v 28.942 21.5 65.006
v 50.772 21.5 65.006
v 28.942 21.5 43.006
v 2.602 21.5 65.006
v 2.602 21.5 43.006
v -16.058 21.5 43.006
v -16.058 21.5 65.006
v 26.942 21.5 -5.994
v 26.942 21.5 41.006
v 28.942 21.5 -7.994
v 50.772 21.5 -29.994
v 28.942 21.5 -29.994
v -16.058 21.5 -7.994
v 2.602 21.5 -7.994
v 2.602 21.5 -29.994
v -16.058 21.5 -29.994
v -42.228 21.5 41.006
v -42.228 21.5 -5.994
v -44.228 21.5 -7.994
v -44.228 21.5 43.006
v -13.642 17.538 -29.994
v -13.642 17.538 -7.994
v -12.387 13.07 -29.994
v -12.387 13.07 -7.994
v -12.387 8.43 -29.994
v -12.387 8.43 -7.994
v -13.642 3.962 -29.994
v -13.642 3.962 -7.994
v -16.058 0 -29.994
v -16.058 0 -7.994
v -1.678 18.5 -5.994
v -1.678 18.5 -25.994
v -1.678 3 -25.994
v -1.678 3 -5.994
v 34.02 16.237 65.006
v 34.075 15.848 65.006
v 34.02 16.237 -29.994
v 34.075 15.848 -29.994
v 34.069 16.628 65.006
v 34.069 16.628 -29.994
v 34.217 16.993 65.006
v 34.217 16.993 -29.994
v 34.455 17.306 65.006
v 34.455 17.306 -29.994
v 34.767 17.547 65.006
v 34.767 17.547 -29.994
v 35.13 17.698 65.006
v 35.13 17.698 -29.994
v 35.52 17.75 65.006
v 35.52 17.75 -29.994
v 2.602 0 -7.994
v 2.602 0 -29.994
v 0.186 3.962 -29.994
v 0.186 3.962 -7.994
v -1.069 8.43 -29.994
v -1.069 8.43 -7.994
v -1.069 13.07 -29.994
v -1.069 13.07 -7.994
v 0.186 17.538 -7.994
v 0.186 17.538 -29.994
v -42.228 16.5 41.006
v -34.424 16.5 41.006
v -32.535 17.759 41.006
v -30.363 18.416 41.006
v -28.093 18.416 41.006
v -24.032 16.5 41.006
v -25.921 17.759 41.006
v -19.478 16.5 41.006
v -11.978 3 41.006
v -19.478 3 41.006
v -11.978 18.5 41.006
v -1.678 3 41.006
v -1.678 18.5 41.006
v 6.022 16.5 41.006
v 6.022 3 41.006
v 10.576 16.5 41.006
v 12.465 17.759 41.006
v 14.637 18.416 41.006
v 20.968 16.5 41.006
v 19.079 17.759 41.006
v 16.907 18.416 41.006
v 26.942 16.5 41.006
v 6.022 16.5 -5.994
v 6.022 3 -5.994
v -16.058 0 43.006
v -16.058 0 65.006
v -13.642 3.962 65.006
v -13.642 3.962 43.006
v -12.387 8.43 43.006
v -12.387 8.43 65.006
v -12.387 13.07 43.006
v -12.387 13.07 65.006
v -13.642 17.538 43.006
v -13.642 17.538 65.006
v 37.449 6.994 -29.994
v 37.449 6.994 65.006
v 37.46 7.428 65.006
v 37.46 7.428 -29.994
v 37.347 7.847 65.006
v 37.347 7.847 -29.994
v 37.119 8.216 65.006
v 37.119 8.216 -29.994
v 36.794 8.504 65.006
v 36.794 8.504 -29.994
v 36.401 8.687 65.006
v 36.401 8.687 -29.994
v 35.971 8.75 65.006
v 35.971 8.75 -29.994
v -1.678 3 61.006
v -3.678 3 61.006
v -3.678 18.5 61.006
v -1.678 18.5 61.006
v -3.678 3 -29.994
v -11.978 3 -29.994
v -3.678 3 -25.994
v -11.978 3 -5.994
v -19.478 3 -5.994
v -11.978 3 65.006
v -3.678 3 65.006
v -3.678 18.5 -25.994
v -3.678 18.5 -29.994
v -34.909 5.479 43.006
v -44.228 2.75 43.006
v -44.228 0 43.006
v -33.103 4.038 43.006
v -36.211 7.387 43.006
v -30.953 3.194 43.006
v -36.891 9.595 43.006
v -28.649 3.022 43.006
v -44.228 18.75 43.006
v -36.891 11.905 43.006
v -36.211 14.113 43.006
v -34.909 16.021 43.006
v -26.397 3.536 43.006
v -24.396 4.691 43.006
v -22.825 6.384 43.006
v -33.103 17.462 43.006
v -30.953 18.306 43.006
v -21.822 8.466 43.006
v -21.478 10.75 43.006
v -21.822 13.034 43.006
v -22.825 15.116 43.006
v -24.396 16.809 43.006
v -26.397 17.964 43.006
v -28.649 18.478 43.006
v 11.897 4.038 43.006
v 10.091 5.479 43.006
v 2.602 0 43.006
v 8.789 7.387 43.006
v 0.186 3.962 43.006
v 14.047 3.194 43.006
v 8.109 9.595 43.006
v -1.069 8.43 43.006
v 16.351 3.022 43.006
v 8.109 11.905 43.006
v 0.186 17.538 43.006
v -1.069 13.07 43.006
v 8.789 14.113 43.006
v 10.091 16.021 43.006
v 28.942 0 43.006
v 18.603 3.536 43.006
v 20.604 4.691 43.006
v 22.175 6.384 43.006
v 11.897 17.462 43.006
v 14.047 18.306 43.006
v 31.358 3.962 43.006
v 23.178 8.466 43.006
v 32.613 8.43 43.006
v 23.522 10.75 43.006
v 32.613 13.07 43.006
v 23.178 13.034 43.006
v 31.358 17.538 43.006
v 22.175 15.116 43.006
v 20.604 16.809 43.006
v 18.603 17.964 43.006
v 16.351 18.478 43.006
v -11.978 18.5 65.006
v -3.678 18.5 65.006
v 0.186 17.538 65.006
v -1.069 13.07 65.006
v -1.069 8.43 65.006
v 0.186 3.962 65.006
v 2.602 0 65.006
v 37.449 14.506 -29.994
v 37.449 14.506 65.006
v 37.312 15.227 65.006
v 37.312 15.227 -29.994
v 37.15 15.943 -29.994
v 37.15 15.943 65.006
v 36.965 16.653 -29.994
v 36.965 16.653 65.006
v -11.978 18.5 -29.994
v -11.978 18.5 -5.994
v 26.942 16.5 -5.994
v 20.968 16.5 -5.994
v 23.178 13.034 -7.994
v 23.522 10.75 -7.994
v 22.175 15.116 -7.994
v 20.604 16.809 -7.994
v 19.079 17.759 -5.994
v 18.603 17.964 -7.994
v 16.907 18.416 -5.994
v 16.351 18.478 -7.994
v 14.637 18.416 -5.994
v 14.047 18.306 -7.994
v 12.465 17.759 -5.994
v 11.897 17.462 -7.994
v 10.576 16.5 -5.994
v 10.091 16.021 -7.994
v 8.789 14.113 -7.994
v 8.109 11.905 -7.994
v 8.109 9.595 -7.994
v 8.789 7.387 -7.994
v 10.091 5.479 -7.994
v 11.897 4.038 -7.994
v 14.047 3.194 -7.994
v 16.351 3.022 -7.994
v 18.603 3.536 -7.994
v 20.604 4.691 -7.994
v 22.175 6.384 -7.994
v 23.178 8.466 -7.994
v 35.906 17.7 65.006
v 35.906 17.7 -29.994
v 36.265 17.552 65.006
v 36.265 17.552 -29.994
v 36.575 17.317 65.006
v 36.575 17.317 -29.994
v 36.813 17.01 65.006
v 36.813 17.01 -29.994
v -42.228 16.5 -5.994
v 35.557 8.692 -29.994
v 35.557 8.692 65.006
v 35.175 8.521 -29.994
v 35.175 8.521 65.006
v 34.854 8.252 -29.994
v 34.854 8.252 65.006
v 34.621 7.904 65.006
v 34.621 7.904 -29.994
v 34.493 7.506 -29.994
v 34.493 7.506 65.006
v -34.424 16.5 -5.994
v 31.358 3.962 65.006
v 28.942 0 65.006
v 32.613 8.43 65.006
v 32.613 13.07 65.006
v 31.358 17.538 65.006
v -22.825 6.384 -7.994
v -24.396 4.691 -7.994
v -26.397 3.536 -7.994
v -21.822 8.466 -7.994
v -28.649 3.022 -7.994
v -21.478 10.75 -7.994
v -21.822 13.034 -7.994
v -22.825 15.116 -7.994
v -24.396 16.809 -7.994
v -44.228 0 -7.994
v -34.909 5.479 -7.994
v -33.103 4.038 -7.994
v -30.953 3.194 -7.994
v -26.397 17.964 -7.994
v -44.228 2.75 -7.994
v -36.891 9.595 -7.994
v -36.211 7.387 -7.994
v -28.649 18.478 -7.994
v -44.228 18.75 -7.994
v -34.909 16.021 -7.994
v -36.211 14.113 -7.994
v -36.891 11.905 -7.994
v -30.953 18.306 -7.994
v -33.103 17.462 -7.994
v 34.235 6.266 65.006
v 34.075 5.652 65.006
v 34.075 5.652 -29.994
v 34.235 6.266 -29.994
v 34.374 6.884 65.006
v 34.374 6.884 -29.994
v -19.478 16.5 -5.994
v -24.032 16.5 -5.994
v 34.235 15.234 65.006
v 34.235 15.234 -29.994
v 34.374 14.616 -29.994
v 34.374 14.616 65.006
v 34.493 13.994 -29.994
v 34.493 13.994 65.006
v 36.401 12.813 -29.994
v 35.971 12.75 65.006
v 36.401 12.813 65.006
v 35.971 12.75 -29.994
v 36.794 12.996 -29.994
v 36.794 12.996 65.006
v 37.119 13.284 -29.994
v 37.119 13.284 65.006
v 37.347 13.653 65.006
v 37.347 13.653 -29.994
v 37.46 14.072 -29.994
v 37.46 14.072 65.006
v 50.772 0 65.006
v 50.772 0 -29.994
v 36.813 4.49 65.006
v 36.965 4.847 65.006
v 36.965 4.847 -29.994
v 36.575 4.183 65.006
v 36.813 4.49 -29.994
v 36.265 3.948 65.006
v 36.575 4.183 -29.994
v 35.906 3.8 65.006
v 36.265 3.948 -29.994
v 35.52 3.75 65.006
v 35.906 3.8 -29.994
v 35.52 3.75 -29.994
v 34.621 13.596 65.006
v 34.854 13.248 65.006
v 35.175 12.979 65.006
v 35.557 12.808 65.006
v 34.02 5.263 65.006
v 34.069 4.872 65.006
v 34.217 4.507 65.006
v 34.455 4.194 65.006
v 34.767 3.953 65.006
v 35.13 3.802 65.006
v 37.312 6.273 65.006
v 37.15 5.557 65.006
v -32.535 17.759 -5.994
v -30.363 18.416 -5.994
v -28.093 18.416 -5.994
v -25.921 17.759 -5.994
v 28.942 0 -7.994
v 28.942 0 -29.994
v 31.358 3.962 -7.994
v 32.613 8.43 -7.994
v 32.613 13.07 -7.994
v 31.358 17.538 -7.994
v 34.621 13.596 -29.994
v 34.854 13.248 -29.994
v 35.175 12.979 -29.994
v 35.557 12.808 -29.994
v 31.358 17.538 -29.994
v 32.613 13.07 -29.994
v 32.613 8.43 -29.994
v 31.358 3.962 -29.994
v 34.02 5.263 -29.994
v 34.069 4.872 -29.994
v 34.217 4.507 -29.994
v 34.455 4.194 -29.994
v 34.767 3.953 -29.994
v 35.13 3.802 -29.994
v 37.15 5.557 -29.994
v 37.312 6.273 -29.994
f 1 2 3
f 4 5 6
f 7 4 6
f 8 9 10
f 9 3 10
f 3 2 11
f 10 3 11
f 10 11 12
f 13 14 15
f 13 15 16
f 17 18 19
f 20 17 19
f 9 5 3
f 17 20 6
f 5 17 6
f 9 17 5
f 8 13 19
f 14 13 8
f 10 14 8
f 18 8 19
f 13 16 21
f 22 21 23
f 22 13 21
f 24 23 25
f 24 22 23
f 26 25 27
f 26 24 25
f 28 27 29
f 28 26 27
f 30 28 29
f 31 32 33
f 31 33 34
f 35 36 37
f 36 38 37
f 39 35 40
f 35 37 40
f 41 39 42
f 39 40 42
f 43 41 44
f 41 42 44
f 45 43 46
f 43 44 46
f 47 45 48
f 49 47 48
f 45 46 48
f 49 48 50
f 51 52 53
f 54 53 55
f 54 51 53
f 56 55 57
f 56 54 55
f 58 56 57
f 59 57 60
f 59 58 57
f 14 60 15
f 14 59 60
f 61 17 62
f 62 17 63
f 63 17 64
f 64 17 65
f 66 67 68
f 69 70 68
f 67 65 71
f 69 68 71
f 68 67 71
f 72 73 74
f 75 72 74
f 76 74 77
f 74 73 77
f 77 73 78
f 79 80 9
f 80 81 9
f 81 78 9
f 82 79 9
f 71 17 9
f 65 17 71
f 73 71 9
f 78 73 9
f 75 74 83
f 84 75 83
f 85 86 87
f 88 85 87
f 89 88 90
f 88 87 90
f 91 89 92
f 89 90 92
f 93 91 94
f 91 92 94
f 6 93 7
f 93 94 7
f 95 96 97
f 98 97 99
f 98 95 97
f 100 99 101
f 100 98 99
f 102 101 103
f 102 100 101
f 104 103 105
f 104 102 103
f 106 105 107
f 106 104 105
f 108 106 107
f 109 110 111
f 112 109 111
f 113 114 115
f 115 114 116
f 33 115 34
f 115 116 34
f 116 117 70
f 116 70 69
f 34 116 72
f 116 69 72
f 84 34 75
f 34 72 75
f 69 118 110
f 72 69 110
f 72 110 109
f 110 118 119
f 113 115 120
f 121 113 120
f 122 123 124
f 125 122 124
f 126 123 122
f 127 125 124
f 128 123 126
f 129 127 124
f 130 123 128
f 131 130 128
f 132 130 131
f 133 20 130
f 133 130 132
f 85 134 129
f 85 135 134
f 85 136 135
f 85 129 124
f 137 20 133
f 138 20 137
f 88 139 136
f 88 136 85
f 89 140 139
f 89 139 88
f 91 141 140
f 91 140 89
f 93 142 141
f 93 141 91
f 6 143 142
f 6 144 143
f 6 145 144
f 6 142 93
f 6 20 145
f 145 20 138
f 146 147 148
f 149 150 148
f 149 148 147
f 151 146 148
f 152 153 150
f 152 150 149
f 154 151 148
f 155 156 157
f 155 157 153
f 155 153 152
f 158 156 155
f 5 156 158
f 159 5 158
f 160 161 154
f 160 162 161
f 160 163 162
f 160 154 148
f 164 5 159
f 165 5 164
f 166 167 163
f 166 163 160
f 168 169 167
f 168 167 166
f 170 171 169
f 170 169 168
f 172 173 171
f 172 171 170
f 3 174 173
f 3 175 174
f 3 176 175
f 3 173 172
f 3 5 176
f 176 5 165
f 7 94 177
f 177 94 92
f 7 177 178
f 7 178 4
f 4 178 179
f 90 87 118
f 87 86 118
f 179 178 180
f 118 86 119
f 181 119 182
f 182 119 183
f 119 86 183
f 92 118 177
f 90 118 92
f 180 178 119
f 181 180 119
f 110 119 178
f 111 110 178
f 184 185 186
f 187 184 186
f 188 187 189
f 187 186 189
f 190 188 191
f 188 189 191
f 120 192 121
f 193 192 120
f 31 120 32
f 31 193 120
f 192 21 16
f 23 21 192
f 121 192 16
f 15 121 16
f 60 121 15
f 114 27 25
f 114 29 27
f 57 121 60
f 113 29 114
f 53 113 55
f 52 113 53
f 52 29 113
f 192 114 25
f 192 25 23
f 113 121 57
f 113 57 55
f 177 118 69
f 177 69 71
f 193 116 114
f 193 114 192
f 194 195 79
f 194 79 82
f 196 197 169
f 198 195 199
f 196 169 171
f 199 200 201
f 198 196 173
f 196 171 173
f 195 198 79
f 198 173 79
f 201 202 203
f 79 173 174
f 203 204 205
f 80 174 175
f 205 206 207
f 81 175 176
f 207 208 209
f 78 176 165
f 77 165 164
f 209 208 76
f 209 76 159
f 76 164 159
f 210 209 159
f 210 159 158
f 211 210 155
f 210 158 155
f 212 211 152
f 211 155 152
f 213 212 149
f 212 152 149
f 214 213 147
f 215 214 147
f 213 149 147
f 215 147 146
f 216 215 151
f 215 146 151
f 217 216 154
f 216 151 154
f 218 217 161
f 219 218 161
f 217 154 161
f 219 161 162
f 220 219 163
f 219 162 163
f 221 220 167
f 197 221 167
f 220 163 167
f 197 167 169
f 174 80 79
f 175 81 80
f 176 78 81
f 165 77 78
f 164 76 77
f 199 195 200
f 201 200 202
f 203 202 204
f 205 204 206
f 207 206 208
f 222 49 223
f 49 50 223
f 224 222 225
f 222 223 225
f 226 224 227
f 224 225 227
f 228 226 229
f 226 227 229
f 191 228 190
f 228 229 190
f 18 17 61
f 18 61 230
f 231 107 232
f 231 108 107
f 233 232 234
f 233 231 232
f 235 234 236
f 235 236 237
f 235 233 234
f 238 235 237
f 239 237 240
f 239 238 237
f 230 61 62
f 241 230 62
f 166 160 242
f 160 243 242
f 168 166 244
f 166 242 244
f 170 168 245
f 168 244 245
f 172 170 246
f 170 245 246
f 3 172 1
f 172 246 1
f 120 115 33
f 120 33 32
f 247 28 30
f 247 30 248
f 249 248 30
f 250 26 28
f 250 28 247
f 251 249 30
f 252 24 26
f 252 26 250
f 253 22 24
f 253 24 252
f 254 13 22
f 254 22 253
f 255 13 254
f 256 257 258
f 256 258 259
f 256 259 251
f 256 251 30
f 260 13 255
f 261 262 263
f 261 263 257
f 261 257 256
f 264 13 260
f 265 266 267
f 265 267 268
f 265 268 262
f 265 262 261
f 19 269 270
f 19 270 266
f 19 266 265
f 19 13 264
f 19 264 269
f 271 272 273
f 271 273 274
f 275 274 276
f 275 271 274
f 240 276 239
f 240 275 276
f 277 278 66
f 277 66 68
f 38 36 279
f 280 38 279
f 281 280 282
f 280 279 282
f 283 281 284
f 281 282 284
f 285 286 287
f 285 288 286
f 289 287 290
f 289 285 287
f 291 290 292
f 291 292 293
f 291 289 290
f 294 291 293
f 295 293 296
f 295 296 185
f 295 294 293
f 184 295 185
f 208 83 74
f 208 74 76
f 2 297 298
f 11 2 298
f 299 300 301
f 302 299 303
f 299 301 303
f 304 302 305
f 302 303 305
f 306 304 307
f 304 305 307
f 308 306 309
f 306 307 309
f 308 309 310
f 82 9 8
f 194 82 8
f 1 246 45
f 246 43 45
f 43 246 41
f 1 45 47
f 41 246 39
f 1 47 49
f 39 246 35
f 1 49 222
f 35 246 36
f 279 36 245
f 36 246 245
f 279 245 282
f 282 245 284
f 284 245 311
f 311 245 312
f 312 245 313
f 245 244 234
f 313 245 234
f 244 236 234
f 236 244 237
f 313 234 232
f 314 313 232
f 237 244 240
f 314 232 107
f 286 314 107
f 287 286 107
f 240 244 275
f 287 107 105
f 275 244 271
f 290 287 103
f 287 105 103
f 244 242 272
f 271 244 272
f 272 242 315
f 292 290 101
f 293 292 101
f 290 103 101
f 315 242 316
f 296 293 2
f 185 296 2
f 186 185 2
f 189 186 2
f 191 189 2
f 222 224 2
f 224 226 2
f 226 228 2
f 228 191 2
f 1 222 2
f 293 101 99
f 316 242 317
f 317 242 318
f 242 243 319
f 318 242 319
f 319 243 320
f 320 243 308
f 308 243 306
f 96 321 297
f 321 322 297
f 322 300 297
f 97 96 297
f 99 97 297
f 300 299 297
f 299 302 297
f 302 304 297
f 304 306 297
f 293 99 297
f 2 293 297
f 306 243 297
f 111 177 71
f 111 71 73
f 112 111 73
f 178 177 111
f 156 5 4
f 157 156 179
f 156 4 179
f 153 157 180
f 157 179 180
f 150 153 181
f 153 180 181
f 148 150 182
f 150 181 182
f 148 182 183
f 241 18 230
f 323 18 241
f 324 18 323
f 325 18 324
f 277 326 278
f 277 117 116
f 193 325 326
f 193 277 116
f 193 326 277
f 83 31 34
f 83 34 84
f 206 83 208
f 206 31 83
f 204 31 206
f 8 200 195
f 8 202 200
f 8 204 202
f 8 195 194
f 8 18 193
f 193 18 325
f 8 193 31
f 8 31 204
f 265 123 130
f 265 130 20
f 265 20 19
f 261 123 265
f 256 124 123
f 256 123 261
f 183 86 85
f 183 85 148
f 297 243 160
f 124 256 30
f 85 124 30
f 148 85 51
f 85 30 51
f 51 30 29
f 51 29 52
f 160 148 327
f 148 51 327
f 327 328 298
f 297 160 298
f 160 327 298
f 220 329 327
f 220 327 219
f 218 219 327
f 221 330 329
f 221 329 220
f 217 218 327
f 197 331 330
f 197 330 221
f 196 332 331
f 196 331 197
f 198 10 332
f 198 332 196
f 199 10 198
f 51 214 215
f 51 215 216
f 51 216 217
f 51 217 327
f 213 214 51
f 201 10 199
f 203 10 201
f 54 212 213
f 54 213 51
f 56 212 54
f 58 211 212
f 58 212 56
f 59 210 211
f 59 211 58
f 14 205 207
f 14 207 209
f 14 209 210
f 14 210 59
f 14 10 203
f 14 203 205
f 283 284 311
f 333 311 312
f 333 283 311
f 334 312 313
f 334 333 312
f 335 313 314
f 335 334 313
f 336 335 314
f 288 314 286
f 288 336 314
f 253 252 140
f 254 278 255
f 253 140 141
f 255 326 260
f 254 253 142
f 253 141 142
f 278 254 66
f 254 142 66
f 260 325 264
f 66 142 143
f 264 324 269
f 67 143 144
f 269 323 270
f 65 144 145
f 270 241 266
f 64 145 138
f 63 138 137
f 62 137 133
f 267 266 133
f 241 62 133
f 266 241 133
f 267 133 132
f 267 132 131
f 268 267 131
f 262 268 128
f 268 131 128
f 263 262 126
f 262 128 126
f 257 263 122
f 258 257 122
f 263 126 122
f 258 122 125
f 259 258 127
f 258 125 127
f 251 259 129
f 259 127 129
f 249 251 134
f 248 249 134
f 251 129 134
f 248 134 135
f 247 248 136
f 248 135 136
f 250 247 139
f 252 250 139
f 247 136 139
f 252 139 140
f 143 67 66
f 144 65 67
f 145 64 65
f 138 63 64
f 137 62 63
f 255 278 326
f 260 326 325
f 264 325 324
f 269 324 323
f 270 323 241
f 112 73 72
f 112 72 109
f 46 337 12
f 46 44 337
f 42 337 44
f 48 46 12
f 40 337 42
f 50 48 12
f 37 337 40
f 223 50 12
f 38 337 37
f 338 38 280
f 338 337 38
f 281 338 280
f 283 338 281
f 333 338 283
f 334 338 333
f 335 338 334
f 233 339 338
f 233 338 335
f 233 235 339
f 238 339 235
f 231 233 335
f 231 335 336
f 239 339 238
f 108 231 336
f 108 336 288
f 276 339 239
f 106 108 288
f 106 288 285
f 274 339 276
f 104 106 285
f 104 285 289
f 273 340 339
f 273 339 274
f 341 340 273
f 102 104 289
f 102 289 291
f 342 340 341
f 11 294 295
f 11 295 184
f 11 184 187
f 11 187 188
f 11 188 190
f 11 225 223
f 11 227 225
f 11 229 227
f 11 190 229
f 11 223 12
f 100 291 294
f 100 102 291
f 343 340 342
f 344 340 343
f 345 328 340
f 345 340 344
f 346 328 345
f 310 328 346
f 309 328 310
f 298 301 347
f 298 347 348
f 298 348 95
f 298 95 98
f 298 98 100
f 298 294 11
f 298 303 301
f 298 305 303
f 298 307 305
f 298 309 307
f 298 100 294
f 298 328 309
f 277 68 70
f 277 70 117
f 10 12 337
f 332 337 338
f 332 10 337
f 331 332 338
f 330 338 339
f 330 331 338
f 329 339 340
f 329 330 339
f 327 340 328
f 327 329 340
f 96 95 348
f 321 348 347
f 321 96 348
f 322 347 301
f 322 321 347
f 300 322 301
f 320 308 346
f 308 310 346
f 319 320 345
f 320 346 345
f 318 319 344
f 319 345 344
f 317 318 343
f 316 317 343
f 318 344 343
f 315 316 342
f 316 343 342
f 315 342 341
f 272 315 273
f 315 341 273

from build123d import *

# Parameters (mm, degrees)
SKETCH1_W           = 95
SKETCH1_H           = 95
BOSS_EXTRUDE1_DEPTH = 25
SKETCH2_R           = 7.75
CUT_EXTRUDE2_DEPTH  = 100
SKETCH3_R           = 17
CUT_EXTRUDE3_DEPTH  = 22
CUT_EXTRUDE4_START  = -22
SKETCH4_R           = 17
CUT_EXTRUDE4_DEPTH  = 22
SKETCH5_W           = 6.246993927
SKETCH5_H           = 25
CUT_EXTRUDE5_DEPTH  = 22
SKETCH6_W           = 7.178723585
SKETCH6_H           = 25
CUT_EXTRUDE6_DEPTH  = 22
SKETCH8_W           = 99.503929421
SKETCH8_H           = 3.5
CUT_EXTRUDE7_DEPTH  = 100
SKETCH9_W           = 8.3
SKETCH9_H           = 15.5
CUT_EXTRUDE11_DEPTH = 100
SKETCH13_W          = 87
SKETCH13_H          = 15.5
CUT_EXTRUDE12_DEPTH = 2
SKETCH14_W          = 25.5
SKETCH14_H          = 47
CUT_EXTRUDE14_DEPTH = 18.5
SKETCH16_W          = 24.75
SKETCH16_H          = 47
CUT_EXTRUDE15_DEPTH = 5
SKETCH17_W          = 20.919567191
SKETCH17_H          = 47
CUT_EXTRUDE16_DEPTH = 5
CUT_EXTRUDE17_DEPTH = 100
FILLET6_R           = 1.5
FILLET7_R           = 1.5
FILLET8_R           = 1.5
FILLET9_R           = 1.5


with BuildPart() as part:
    # Sketch1 → Boss-Extrude1 (new body)
    with BuildSketch(Plane(origin=(0, 0, 0), x_dir=(1, 0, 0), z_dir=(0, 1, 0))):
        with Locations((3.271948822, -17.506298191)):
            Rectangle(SKETCH1_W, SKETCH1_H)
    extrude(amount=BOSS_EXTRUDE1_DEPTH)

    # Sketch2 → Cut-Extrude2 (cut)
    with BuildSketch(Plane.XY.offset(65.006298191)):
        with Locations((-29.228051178, 10.75)):
            Circle(SKETCH2_R)
        with Locations((15.771948822, 10.75)):
            Circle(SKETCH2_R)
    extrude(amount=-CUT_EXTRUDE2_DEPTH, mode=Mode.SUBTRACT)

    # Sketch3 → Cut-Extrude3 (cut)
    with BuildSketch(Plane.XY.offset(65.006298191)):
        with Locations((-29.228051178, 10.75)):
            Circle(SKETCH3_R)
        with Locations((15.771948822, 10.75)):
            Circle(SKETCH3_R)
    extrude(amount=-CUT_EXTRUDE3_DEPTH, mode=Mode.SUBTRACT)

    # Sketch4 → Cut-Extrude4 (cut)
    with BuildSketch(Plane(origin=(0, 0, -29.993701809), x_dir=(-1, 0, 0), z_dir=(0, 0, -1)).offset(CUT_EXTRUDE4_START)):
        with Locations((-15.771948822, 10.75)):
            Circle(SKETCH4_R)
        with Locations((29.228051178, 10.75)):
            Circle(SKETCH4_R)
    extrude(amount=CUT_EXTRUDE4_DEPTH, mode=Mode.SUBTRACT)

    # Sketch5 → Cut-Extrude5 (cut)
    with BuildSketch(Plane.XY.offset(65.006298191)):
        with Locations((-41.104554214, 12.5)):
            Rectangle(SKETCH5_W, SKETCH5_H)
    extrude(amount=-CUT_EXTRUDE5_DEPTH, mode=Mode.SUBTRACT)

    # Sketch6 → Cut-Extrude6 (cut)
    with BuildSketch(Plane(origin=(0, 0, -29.993701809), x_dir=(-1, 0, 0), z_dir=(0, 0, -1))):
        with Locations((40.638689386, 12.5)):
            Rectangle(SKETCH6_W, SKETCH6_H)
    extrude(amount=-CUT_EXTRUDE6_DEPTH, mode=Mode.SUBTRACT)

    # Sketch8 → Cut-Extrude7 (cut)
    with BuildSketch(Plane(origin=(0, 0, -29.993701809), x_dir=(-1, 0, 0), z_dir=(0, 0, -1))):
        with Locations((-1.019984112, 23.25)):
            Rectangle(SKETCH8_W, SKETCH8_H)
    extrude(amount=-CUT_EXTRUDE7_DEPTH, mode=Mode.SUBTRACT)

    # Sketch9 → Cut-Extrude11 (cut)
    with BuildSketch(Plane.XY.offset(65.006298191)):
        with Locations((-7.828051178, 10.75)):
            Rectangle(SKETCH9_W, SKETCH9_H)
    extrude(amount=-CUT_EXTRUDE11_DEPTH, mode=Mode.SUBTRACT)

    # Sketch13 → Cut-Extrude12 (cut)
    with BuildSketch(Plane.ZY.offset(3.678051178)):
        with Locations((17.506298191, 10.75)):
            Rectangle(SKETCH13_W, SKETCH13_H)
    extrude(amount=-CUT_EXTRUDE12_DEPTH, mode=Mode.SUBTRACT)

    # Sketch14 → Cut-Extrude14 (cut)
    with BuildSketch(Plane(origin=(0, 21.5, 0), x_dir=(1, 0, 0), z_dir=(0, 1, 0))):
        with Locations((-6.728051178, -17.506298191)):
            Rectangle(SKETCH14_W, SKETCH14_H)
    extrude(amount=-CUT_EXTRUDE14_DEPTH, mode=Mode.SUBTRACT)

    # Sketch16 → Cut-Extrude15 (cut)
    with BuildSketch(Plane(origin=(0, 21.5, 0), x_dir=(1, 0, 0), z_dir=(0, 1, 0))):
        with Locations((-29.853051178, -17.506298191)):
            Rectangle(SKETCH16_W, SKETCH16_H)
    extrude(amount=-CUT_EXTRUDE15_DEPTH, mode=Mode.SUBTRACT)

    # Sketch17 → Cut-Extrude16 (cut)
    with BuildSketch(Plane(origin=(0, 21.5, 0), x_dir=(1, 0, 0), z_dir=(0, 1, 0))):
        with Locations((16.481732418, -17.506298191)):
            Rectangle(SKETCH17_W, SKETCH17_H)
    extrude(amount=-CUT_EXTRUDE16_DEPTH, mode=Mode.SUBTRACT)

    # Sketch18 → Cut-Extrude17 (cut)
    with BuildSketch(Plane.XY.offset(65.006298191)):
        with BuildLine():
            Line((34.66639245, 12.75), (37.680851122, 12.75))
            ThreePointArc((37.680851122, 12.75), (37.300376381, 15.28065192), (36.628602437, 17.75))
            Line((36.628602437, 17.75), (33.435470555, 17.75))
            ThreePointArc((33.435470555, 17.75), (34.221100776, 15.291893017), (34.66639245, 12.75))
        make_face()
        with BuildLine():
            Line((34.66639245, 8.75), (37.680851122, 8.75))
            ThreePointArc((37.680851122, 8.75), (37.300376381, 6.21934808), (36.628602437, 3.75))
            Line((36.628602437, 3.75), (33.435470555, 3.75))
            ThreePointArc((33.435470555, 3.75), (34.221100776, 6.208106983), (34.66639245, 8.75))
        make_face()
    extrude(amount=-CUT_EXTRUDE17_DEPTH, mode=Mode.SUBTRACT)

    # Fillet6
    fillet6_edges = [part.edges().sort_by_distance(p)[0] for p in [
        (33.435470555, 17.75, 17.506298191),
        (36.628602437, 17.75, 17.506298191),
    ]]
    fillet(fillet6_edges, radius=FILLET6_R - 0.0001)  # a hair under: the kernel refuses the full size

    # Fillet7
    fillet7_edges = [part.edges().sort_by_distance(p)[0] for p in [
        (37.680851122, 12.75, 17.506298191),
        (34.66639245, 12.75, 17.506298191),
    ]]
    fillet(fillet7_edges, radius=FILLET7_R - 0.0001)  # a hair under: the kernel refuses the full size

    # Fillet8
    fillet8_edges = [part.edges().sort_by_distance(p)[0] for p in [
        (33.435470555, 3.75, 17.506298191),
        (36.628602437, 3.75, 17.506298191),
    ]]
    fillet(fillet8_edges, radius=FILLET8_R - 0.0001)  # a hair under: the kernel refuses the full size

    # Fillet9
    fillet9_edges = [part.edges().sort_by_distance(p)[0] for p in [
        (37.680851122, 8.75, 17.506298191),
        (34.66639245, 8.75, 17.506298191),
    ]]
    fillet(fillet9_edges, radius=FILLET9_R - 0.0001)  # a hair under: the kernel refuses the full size


solid = part.part
